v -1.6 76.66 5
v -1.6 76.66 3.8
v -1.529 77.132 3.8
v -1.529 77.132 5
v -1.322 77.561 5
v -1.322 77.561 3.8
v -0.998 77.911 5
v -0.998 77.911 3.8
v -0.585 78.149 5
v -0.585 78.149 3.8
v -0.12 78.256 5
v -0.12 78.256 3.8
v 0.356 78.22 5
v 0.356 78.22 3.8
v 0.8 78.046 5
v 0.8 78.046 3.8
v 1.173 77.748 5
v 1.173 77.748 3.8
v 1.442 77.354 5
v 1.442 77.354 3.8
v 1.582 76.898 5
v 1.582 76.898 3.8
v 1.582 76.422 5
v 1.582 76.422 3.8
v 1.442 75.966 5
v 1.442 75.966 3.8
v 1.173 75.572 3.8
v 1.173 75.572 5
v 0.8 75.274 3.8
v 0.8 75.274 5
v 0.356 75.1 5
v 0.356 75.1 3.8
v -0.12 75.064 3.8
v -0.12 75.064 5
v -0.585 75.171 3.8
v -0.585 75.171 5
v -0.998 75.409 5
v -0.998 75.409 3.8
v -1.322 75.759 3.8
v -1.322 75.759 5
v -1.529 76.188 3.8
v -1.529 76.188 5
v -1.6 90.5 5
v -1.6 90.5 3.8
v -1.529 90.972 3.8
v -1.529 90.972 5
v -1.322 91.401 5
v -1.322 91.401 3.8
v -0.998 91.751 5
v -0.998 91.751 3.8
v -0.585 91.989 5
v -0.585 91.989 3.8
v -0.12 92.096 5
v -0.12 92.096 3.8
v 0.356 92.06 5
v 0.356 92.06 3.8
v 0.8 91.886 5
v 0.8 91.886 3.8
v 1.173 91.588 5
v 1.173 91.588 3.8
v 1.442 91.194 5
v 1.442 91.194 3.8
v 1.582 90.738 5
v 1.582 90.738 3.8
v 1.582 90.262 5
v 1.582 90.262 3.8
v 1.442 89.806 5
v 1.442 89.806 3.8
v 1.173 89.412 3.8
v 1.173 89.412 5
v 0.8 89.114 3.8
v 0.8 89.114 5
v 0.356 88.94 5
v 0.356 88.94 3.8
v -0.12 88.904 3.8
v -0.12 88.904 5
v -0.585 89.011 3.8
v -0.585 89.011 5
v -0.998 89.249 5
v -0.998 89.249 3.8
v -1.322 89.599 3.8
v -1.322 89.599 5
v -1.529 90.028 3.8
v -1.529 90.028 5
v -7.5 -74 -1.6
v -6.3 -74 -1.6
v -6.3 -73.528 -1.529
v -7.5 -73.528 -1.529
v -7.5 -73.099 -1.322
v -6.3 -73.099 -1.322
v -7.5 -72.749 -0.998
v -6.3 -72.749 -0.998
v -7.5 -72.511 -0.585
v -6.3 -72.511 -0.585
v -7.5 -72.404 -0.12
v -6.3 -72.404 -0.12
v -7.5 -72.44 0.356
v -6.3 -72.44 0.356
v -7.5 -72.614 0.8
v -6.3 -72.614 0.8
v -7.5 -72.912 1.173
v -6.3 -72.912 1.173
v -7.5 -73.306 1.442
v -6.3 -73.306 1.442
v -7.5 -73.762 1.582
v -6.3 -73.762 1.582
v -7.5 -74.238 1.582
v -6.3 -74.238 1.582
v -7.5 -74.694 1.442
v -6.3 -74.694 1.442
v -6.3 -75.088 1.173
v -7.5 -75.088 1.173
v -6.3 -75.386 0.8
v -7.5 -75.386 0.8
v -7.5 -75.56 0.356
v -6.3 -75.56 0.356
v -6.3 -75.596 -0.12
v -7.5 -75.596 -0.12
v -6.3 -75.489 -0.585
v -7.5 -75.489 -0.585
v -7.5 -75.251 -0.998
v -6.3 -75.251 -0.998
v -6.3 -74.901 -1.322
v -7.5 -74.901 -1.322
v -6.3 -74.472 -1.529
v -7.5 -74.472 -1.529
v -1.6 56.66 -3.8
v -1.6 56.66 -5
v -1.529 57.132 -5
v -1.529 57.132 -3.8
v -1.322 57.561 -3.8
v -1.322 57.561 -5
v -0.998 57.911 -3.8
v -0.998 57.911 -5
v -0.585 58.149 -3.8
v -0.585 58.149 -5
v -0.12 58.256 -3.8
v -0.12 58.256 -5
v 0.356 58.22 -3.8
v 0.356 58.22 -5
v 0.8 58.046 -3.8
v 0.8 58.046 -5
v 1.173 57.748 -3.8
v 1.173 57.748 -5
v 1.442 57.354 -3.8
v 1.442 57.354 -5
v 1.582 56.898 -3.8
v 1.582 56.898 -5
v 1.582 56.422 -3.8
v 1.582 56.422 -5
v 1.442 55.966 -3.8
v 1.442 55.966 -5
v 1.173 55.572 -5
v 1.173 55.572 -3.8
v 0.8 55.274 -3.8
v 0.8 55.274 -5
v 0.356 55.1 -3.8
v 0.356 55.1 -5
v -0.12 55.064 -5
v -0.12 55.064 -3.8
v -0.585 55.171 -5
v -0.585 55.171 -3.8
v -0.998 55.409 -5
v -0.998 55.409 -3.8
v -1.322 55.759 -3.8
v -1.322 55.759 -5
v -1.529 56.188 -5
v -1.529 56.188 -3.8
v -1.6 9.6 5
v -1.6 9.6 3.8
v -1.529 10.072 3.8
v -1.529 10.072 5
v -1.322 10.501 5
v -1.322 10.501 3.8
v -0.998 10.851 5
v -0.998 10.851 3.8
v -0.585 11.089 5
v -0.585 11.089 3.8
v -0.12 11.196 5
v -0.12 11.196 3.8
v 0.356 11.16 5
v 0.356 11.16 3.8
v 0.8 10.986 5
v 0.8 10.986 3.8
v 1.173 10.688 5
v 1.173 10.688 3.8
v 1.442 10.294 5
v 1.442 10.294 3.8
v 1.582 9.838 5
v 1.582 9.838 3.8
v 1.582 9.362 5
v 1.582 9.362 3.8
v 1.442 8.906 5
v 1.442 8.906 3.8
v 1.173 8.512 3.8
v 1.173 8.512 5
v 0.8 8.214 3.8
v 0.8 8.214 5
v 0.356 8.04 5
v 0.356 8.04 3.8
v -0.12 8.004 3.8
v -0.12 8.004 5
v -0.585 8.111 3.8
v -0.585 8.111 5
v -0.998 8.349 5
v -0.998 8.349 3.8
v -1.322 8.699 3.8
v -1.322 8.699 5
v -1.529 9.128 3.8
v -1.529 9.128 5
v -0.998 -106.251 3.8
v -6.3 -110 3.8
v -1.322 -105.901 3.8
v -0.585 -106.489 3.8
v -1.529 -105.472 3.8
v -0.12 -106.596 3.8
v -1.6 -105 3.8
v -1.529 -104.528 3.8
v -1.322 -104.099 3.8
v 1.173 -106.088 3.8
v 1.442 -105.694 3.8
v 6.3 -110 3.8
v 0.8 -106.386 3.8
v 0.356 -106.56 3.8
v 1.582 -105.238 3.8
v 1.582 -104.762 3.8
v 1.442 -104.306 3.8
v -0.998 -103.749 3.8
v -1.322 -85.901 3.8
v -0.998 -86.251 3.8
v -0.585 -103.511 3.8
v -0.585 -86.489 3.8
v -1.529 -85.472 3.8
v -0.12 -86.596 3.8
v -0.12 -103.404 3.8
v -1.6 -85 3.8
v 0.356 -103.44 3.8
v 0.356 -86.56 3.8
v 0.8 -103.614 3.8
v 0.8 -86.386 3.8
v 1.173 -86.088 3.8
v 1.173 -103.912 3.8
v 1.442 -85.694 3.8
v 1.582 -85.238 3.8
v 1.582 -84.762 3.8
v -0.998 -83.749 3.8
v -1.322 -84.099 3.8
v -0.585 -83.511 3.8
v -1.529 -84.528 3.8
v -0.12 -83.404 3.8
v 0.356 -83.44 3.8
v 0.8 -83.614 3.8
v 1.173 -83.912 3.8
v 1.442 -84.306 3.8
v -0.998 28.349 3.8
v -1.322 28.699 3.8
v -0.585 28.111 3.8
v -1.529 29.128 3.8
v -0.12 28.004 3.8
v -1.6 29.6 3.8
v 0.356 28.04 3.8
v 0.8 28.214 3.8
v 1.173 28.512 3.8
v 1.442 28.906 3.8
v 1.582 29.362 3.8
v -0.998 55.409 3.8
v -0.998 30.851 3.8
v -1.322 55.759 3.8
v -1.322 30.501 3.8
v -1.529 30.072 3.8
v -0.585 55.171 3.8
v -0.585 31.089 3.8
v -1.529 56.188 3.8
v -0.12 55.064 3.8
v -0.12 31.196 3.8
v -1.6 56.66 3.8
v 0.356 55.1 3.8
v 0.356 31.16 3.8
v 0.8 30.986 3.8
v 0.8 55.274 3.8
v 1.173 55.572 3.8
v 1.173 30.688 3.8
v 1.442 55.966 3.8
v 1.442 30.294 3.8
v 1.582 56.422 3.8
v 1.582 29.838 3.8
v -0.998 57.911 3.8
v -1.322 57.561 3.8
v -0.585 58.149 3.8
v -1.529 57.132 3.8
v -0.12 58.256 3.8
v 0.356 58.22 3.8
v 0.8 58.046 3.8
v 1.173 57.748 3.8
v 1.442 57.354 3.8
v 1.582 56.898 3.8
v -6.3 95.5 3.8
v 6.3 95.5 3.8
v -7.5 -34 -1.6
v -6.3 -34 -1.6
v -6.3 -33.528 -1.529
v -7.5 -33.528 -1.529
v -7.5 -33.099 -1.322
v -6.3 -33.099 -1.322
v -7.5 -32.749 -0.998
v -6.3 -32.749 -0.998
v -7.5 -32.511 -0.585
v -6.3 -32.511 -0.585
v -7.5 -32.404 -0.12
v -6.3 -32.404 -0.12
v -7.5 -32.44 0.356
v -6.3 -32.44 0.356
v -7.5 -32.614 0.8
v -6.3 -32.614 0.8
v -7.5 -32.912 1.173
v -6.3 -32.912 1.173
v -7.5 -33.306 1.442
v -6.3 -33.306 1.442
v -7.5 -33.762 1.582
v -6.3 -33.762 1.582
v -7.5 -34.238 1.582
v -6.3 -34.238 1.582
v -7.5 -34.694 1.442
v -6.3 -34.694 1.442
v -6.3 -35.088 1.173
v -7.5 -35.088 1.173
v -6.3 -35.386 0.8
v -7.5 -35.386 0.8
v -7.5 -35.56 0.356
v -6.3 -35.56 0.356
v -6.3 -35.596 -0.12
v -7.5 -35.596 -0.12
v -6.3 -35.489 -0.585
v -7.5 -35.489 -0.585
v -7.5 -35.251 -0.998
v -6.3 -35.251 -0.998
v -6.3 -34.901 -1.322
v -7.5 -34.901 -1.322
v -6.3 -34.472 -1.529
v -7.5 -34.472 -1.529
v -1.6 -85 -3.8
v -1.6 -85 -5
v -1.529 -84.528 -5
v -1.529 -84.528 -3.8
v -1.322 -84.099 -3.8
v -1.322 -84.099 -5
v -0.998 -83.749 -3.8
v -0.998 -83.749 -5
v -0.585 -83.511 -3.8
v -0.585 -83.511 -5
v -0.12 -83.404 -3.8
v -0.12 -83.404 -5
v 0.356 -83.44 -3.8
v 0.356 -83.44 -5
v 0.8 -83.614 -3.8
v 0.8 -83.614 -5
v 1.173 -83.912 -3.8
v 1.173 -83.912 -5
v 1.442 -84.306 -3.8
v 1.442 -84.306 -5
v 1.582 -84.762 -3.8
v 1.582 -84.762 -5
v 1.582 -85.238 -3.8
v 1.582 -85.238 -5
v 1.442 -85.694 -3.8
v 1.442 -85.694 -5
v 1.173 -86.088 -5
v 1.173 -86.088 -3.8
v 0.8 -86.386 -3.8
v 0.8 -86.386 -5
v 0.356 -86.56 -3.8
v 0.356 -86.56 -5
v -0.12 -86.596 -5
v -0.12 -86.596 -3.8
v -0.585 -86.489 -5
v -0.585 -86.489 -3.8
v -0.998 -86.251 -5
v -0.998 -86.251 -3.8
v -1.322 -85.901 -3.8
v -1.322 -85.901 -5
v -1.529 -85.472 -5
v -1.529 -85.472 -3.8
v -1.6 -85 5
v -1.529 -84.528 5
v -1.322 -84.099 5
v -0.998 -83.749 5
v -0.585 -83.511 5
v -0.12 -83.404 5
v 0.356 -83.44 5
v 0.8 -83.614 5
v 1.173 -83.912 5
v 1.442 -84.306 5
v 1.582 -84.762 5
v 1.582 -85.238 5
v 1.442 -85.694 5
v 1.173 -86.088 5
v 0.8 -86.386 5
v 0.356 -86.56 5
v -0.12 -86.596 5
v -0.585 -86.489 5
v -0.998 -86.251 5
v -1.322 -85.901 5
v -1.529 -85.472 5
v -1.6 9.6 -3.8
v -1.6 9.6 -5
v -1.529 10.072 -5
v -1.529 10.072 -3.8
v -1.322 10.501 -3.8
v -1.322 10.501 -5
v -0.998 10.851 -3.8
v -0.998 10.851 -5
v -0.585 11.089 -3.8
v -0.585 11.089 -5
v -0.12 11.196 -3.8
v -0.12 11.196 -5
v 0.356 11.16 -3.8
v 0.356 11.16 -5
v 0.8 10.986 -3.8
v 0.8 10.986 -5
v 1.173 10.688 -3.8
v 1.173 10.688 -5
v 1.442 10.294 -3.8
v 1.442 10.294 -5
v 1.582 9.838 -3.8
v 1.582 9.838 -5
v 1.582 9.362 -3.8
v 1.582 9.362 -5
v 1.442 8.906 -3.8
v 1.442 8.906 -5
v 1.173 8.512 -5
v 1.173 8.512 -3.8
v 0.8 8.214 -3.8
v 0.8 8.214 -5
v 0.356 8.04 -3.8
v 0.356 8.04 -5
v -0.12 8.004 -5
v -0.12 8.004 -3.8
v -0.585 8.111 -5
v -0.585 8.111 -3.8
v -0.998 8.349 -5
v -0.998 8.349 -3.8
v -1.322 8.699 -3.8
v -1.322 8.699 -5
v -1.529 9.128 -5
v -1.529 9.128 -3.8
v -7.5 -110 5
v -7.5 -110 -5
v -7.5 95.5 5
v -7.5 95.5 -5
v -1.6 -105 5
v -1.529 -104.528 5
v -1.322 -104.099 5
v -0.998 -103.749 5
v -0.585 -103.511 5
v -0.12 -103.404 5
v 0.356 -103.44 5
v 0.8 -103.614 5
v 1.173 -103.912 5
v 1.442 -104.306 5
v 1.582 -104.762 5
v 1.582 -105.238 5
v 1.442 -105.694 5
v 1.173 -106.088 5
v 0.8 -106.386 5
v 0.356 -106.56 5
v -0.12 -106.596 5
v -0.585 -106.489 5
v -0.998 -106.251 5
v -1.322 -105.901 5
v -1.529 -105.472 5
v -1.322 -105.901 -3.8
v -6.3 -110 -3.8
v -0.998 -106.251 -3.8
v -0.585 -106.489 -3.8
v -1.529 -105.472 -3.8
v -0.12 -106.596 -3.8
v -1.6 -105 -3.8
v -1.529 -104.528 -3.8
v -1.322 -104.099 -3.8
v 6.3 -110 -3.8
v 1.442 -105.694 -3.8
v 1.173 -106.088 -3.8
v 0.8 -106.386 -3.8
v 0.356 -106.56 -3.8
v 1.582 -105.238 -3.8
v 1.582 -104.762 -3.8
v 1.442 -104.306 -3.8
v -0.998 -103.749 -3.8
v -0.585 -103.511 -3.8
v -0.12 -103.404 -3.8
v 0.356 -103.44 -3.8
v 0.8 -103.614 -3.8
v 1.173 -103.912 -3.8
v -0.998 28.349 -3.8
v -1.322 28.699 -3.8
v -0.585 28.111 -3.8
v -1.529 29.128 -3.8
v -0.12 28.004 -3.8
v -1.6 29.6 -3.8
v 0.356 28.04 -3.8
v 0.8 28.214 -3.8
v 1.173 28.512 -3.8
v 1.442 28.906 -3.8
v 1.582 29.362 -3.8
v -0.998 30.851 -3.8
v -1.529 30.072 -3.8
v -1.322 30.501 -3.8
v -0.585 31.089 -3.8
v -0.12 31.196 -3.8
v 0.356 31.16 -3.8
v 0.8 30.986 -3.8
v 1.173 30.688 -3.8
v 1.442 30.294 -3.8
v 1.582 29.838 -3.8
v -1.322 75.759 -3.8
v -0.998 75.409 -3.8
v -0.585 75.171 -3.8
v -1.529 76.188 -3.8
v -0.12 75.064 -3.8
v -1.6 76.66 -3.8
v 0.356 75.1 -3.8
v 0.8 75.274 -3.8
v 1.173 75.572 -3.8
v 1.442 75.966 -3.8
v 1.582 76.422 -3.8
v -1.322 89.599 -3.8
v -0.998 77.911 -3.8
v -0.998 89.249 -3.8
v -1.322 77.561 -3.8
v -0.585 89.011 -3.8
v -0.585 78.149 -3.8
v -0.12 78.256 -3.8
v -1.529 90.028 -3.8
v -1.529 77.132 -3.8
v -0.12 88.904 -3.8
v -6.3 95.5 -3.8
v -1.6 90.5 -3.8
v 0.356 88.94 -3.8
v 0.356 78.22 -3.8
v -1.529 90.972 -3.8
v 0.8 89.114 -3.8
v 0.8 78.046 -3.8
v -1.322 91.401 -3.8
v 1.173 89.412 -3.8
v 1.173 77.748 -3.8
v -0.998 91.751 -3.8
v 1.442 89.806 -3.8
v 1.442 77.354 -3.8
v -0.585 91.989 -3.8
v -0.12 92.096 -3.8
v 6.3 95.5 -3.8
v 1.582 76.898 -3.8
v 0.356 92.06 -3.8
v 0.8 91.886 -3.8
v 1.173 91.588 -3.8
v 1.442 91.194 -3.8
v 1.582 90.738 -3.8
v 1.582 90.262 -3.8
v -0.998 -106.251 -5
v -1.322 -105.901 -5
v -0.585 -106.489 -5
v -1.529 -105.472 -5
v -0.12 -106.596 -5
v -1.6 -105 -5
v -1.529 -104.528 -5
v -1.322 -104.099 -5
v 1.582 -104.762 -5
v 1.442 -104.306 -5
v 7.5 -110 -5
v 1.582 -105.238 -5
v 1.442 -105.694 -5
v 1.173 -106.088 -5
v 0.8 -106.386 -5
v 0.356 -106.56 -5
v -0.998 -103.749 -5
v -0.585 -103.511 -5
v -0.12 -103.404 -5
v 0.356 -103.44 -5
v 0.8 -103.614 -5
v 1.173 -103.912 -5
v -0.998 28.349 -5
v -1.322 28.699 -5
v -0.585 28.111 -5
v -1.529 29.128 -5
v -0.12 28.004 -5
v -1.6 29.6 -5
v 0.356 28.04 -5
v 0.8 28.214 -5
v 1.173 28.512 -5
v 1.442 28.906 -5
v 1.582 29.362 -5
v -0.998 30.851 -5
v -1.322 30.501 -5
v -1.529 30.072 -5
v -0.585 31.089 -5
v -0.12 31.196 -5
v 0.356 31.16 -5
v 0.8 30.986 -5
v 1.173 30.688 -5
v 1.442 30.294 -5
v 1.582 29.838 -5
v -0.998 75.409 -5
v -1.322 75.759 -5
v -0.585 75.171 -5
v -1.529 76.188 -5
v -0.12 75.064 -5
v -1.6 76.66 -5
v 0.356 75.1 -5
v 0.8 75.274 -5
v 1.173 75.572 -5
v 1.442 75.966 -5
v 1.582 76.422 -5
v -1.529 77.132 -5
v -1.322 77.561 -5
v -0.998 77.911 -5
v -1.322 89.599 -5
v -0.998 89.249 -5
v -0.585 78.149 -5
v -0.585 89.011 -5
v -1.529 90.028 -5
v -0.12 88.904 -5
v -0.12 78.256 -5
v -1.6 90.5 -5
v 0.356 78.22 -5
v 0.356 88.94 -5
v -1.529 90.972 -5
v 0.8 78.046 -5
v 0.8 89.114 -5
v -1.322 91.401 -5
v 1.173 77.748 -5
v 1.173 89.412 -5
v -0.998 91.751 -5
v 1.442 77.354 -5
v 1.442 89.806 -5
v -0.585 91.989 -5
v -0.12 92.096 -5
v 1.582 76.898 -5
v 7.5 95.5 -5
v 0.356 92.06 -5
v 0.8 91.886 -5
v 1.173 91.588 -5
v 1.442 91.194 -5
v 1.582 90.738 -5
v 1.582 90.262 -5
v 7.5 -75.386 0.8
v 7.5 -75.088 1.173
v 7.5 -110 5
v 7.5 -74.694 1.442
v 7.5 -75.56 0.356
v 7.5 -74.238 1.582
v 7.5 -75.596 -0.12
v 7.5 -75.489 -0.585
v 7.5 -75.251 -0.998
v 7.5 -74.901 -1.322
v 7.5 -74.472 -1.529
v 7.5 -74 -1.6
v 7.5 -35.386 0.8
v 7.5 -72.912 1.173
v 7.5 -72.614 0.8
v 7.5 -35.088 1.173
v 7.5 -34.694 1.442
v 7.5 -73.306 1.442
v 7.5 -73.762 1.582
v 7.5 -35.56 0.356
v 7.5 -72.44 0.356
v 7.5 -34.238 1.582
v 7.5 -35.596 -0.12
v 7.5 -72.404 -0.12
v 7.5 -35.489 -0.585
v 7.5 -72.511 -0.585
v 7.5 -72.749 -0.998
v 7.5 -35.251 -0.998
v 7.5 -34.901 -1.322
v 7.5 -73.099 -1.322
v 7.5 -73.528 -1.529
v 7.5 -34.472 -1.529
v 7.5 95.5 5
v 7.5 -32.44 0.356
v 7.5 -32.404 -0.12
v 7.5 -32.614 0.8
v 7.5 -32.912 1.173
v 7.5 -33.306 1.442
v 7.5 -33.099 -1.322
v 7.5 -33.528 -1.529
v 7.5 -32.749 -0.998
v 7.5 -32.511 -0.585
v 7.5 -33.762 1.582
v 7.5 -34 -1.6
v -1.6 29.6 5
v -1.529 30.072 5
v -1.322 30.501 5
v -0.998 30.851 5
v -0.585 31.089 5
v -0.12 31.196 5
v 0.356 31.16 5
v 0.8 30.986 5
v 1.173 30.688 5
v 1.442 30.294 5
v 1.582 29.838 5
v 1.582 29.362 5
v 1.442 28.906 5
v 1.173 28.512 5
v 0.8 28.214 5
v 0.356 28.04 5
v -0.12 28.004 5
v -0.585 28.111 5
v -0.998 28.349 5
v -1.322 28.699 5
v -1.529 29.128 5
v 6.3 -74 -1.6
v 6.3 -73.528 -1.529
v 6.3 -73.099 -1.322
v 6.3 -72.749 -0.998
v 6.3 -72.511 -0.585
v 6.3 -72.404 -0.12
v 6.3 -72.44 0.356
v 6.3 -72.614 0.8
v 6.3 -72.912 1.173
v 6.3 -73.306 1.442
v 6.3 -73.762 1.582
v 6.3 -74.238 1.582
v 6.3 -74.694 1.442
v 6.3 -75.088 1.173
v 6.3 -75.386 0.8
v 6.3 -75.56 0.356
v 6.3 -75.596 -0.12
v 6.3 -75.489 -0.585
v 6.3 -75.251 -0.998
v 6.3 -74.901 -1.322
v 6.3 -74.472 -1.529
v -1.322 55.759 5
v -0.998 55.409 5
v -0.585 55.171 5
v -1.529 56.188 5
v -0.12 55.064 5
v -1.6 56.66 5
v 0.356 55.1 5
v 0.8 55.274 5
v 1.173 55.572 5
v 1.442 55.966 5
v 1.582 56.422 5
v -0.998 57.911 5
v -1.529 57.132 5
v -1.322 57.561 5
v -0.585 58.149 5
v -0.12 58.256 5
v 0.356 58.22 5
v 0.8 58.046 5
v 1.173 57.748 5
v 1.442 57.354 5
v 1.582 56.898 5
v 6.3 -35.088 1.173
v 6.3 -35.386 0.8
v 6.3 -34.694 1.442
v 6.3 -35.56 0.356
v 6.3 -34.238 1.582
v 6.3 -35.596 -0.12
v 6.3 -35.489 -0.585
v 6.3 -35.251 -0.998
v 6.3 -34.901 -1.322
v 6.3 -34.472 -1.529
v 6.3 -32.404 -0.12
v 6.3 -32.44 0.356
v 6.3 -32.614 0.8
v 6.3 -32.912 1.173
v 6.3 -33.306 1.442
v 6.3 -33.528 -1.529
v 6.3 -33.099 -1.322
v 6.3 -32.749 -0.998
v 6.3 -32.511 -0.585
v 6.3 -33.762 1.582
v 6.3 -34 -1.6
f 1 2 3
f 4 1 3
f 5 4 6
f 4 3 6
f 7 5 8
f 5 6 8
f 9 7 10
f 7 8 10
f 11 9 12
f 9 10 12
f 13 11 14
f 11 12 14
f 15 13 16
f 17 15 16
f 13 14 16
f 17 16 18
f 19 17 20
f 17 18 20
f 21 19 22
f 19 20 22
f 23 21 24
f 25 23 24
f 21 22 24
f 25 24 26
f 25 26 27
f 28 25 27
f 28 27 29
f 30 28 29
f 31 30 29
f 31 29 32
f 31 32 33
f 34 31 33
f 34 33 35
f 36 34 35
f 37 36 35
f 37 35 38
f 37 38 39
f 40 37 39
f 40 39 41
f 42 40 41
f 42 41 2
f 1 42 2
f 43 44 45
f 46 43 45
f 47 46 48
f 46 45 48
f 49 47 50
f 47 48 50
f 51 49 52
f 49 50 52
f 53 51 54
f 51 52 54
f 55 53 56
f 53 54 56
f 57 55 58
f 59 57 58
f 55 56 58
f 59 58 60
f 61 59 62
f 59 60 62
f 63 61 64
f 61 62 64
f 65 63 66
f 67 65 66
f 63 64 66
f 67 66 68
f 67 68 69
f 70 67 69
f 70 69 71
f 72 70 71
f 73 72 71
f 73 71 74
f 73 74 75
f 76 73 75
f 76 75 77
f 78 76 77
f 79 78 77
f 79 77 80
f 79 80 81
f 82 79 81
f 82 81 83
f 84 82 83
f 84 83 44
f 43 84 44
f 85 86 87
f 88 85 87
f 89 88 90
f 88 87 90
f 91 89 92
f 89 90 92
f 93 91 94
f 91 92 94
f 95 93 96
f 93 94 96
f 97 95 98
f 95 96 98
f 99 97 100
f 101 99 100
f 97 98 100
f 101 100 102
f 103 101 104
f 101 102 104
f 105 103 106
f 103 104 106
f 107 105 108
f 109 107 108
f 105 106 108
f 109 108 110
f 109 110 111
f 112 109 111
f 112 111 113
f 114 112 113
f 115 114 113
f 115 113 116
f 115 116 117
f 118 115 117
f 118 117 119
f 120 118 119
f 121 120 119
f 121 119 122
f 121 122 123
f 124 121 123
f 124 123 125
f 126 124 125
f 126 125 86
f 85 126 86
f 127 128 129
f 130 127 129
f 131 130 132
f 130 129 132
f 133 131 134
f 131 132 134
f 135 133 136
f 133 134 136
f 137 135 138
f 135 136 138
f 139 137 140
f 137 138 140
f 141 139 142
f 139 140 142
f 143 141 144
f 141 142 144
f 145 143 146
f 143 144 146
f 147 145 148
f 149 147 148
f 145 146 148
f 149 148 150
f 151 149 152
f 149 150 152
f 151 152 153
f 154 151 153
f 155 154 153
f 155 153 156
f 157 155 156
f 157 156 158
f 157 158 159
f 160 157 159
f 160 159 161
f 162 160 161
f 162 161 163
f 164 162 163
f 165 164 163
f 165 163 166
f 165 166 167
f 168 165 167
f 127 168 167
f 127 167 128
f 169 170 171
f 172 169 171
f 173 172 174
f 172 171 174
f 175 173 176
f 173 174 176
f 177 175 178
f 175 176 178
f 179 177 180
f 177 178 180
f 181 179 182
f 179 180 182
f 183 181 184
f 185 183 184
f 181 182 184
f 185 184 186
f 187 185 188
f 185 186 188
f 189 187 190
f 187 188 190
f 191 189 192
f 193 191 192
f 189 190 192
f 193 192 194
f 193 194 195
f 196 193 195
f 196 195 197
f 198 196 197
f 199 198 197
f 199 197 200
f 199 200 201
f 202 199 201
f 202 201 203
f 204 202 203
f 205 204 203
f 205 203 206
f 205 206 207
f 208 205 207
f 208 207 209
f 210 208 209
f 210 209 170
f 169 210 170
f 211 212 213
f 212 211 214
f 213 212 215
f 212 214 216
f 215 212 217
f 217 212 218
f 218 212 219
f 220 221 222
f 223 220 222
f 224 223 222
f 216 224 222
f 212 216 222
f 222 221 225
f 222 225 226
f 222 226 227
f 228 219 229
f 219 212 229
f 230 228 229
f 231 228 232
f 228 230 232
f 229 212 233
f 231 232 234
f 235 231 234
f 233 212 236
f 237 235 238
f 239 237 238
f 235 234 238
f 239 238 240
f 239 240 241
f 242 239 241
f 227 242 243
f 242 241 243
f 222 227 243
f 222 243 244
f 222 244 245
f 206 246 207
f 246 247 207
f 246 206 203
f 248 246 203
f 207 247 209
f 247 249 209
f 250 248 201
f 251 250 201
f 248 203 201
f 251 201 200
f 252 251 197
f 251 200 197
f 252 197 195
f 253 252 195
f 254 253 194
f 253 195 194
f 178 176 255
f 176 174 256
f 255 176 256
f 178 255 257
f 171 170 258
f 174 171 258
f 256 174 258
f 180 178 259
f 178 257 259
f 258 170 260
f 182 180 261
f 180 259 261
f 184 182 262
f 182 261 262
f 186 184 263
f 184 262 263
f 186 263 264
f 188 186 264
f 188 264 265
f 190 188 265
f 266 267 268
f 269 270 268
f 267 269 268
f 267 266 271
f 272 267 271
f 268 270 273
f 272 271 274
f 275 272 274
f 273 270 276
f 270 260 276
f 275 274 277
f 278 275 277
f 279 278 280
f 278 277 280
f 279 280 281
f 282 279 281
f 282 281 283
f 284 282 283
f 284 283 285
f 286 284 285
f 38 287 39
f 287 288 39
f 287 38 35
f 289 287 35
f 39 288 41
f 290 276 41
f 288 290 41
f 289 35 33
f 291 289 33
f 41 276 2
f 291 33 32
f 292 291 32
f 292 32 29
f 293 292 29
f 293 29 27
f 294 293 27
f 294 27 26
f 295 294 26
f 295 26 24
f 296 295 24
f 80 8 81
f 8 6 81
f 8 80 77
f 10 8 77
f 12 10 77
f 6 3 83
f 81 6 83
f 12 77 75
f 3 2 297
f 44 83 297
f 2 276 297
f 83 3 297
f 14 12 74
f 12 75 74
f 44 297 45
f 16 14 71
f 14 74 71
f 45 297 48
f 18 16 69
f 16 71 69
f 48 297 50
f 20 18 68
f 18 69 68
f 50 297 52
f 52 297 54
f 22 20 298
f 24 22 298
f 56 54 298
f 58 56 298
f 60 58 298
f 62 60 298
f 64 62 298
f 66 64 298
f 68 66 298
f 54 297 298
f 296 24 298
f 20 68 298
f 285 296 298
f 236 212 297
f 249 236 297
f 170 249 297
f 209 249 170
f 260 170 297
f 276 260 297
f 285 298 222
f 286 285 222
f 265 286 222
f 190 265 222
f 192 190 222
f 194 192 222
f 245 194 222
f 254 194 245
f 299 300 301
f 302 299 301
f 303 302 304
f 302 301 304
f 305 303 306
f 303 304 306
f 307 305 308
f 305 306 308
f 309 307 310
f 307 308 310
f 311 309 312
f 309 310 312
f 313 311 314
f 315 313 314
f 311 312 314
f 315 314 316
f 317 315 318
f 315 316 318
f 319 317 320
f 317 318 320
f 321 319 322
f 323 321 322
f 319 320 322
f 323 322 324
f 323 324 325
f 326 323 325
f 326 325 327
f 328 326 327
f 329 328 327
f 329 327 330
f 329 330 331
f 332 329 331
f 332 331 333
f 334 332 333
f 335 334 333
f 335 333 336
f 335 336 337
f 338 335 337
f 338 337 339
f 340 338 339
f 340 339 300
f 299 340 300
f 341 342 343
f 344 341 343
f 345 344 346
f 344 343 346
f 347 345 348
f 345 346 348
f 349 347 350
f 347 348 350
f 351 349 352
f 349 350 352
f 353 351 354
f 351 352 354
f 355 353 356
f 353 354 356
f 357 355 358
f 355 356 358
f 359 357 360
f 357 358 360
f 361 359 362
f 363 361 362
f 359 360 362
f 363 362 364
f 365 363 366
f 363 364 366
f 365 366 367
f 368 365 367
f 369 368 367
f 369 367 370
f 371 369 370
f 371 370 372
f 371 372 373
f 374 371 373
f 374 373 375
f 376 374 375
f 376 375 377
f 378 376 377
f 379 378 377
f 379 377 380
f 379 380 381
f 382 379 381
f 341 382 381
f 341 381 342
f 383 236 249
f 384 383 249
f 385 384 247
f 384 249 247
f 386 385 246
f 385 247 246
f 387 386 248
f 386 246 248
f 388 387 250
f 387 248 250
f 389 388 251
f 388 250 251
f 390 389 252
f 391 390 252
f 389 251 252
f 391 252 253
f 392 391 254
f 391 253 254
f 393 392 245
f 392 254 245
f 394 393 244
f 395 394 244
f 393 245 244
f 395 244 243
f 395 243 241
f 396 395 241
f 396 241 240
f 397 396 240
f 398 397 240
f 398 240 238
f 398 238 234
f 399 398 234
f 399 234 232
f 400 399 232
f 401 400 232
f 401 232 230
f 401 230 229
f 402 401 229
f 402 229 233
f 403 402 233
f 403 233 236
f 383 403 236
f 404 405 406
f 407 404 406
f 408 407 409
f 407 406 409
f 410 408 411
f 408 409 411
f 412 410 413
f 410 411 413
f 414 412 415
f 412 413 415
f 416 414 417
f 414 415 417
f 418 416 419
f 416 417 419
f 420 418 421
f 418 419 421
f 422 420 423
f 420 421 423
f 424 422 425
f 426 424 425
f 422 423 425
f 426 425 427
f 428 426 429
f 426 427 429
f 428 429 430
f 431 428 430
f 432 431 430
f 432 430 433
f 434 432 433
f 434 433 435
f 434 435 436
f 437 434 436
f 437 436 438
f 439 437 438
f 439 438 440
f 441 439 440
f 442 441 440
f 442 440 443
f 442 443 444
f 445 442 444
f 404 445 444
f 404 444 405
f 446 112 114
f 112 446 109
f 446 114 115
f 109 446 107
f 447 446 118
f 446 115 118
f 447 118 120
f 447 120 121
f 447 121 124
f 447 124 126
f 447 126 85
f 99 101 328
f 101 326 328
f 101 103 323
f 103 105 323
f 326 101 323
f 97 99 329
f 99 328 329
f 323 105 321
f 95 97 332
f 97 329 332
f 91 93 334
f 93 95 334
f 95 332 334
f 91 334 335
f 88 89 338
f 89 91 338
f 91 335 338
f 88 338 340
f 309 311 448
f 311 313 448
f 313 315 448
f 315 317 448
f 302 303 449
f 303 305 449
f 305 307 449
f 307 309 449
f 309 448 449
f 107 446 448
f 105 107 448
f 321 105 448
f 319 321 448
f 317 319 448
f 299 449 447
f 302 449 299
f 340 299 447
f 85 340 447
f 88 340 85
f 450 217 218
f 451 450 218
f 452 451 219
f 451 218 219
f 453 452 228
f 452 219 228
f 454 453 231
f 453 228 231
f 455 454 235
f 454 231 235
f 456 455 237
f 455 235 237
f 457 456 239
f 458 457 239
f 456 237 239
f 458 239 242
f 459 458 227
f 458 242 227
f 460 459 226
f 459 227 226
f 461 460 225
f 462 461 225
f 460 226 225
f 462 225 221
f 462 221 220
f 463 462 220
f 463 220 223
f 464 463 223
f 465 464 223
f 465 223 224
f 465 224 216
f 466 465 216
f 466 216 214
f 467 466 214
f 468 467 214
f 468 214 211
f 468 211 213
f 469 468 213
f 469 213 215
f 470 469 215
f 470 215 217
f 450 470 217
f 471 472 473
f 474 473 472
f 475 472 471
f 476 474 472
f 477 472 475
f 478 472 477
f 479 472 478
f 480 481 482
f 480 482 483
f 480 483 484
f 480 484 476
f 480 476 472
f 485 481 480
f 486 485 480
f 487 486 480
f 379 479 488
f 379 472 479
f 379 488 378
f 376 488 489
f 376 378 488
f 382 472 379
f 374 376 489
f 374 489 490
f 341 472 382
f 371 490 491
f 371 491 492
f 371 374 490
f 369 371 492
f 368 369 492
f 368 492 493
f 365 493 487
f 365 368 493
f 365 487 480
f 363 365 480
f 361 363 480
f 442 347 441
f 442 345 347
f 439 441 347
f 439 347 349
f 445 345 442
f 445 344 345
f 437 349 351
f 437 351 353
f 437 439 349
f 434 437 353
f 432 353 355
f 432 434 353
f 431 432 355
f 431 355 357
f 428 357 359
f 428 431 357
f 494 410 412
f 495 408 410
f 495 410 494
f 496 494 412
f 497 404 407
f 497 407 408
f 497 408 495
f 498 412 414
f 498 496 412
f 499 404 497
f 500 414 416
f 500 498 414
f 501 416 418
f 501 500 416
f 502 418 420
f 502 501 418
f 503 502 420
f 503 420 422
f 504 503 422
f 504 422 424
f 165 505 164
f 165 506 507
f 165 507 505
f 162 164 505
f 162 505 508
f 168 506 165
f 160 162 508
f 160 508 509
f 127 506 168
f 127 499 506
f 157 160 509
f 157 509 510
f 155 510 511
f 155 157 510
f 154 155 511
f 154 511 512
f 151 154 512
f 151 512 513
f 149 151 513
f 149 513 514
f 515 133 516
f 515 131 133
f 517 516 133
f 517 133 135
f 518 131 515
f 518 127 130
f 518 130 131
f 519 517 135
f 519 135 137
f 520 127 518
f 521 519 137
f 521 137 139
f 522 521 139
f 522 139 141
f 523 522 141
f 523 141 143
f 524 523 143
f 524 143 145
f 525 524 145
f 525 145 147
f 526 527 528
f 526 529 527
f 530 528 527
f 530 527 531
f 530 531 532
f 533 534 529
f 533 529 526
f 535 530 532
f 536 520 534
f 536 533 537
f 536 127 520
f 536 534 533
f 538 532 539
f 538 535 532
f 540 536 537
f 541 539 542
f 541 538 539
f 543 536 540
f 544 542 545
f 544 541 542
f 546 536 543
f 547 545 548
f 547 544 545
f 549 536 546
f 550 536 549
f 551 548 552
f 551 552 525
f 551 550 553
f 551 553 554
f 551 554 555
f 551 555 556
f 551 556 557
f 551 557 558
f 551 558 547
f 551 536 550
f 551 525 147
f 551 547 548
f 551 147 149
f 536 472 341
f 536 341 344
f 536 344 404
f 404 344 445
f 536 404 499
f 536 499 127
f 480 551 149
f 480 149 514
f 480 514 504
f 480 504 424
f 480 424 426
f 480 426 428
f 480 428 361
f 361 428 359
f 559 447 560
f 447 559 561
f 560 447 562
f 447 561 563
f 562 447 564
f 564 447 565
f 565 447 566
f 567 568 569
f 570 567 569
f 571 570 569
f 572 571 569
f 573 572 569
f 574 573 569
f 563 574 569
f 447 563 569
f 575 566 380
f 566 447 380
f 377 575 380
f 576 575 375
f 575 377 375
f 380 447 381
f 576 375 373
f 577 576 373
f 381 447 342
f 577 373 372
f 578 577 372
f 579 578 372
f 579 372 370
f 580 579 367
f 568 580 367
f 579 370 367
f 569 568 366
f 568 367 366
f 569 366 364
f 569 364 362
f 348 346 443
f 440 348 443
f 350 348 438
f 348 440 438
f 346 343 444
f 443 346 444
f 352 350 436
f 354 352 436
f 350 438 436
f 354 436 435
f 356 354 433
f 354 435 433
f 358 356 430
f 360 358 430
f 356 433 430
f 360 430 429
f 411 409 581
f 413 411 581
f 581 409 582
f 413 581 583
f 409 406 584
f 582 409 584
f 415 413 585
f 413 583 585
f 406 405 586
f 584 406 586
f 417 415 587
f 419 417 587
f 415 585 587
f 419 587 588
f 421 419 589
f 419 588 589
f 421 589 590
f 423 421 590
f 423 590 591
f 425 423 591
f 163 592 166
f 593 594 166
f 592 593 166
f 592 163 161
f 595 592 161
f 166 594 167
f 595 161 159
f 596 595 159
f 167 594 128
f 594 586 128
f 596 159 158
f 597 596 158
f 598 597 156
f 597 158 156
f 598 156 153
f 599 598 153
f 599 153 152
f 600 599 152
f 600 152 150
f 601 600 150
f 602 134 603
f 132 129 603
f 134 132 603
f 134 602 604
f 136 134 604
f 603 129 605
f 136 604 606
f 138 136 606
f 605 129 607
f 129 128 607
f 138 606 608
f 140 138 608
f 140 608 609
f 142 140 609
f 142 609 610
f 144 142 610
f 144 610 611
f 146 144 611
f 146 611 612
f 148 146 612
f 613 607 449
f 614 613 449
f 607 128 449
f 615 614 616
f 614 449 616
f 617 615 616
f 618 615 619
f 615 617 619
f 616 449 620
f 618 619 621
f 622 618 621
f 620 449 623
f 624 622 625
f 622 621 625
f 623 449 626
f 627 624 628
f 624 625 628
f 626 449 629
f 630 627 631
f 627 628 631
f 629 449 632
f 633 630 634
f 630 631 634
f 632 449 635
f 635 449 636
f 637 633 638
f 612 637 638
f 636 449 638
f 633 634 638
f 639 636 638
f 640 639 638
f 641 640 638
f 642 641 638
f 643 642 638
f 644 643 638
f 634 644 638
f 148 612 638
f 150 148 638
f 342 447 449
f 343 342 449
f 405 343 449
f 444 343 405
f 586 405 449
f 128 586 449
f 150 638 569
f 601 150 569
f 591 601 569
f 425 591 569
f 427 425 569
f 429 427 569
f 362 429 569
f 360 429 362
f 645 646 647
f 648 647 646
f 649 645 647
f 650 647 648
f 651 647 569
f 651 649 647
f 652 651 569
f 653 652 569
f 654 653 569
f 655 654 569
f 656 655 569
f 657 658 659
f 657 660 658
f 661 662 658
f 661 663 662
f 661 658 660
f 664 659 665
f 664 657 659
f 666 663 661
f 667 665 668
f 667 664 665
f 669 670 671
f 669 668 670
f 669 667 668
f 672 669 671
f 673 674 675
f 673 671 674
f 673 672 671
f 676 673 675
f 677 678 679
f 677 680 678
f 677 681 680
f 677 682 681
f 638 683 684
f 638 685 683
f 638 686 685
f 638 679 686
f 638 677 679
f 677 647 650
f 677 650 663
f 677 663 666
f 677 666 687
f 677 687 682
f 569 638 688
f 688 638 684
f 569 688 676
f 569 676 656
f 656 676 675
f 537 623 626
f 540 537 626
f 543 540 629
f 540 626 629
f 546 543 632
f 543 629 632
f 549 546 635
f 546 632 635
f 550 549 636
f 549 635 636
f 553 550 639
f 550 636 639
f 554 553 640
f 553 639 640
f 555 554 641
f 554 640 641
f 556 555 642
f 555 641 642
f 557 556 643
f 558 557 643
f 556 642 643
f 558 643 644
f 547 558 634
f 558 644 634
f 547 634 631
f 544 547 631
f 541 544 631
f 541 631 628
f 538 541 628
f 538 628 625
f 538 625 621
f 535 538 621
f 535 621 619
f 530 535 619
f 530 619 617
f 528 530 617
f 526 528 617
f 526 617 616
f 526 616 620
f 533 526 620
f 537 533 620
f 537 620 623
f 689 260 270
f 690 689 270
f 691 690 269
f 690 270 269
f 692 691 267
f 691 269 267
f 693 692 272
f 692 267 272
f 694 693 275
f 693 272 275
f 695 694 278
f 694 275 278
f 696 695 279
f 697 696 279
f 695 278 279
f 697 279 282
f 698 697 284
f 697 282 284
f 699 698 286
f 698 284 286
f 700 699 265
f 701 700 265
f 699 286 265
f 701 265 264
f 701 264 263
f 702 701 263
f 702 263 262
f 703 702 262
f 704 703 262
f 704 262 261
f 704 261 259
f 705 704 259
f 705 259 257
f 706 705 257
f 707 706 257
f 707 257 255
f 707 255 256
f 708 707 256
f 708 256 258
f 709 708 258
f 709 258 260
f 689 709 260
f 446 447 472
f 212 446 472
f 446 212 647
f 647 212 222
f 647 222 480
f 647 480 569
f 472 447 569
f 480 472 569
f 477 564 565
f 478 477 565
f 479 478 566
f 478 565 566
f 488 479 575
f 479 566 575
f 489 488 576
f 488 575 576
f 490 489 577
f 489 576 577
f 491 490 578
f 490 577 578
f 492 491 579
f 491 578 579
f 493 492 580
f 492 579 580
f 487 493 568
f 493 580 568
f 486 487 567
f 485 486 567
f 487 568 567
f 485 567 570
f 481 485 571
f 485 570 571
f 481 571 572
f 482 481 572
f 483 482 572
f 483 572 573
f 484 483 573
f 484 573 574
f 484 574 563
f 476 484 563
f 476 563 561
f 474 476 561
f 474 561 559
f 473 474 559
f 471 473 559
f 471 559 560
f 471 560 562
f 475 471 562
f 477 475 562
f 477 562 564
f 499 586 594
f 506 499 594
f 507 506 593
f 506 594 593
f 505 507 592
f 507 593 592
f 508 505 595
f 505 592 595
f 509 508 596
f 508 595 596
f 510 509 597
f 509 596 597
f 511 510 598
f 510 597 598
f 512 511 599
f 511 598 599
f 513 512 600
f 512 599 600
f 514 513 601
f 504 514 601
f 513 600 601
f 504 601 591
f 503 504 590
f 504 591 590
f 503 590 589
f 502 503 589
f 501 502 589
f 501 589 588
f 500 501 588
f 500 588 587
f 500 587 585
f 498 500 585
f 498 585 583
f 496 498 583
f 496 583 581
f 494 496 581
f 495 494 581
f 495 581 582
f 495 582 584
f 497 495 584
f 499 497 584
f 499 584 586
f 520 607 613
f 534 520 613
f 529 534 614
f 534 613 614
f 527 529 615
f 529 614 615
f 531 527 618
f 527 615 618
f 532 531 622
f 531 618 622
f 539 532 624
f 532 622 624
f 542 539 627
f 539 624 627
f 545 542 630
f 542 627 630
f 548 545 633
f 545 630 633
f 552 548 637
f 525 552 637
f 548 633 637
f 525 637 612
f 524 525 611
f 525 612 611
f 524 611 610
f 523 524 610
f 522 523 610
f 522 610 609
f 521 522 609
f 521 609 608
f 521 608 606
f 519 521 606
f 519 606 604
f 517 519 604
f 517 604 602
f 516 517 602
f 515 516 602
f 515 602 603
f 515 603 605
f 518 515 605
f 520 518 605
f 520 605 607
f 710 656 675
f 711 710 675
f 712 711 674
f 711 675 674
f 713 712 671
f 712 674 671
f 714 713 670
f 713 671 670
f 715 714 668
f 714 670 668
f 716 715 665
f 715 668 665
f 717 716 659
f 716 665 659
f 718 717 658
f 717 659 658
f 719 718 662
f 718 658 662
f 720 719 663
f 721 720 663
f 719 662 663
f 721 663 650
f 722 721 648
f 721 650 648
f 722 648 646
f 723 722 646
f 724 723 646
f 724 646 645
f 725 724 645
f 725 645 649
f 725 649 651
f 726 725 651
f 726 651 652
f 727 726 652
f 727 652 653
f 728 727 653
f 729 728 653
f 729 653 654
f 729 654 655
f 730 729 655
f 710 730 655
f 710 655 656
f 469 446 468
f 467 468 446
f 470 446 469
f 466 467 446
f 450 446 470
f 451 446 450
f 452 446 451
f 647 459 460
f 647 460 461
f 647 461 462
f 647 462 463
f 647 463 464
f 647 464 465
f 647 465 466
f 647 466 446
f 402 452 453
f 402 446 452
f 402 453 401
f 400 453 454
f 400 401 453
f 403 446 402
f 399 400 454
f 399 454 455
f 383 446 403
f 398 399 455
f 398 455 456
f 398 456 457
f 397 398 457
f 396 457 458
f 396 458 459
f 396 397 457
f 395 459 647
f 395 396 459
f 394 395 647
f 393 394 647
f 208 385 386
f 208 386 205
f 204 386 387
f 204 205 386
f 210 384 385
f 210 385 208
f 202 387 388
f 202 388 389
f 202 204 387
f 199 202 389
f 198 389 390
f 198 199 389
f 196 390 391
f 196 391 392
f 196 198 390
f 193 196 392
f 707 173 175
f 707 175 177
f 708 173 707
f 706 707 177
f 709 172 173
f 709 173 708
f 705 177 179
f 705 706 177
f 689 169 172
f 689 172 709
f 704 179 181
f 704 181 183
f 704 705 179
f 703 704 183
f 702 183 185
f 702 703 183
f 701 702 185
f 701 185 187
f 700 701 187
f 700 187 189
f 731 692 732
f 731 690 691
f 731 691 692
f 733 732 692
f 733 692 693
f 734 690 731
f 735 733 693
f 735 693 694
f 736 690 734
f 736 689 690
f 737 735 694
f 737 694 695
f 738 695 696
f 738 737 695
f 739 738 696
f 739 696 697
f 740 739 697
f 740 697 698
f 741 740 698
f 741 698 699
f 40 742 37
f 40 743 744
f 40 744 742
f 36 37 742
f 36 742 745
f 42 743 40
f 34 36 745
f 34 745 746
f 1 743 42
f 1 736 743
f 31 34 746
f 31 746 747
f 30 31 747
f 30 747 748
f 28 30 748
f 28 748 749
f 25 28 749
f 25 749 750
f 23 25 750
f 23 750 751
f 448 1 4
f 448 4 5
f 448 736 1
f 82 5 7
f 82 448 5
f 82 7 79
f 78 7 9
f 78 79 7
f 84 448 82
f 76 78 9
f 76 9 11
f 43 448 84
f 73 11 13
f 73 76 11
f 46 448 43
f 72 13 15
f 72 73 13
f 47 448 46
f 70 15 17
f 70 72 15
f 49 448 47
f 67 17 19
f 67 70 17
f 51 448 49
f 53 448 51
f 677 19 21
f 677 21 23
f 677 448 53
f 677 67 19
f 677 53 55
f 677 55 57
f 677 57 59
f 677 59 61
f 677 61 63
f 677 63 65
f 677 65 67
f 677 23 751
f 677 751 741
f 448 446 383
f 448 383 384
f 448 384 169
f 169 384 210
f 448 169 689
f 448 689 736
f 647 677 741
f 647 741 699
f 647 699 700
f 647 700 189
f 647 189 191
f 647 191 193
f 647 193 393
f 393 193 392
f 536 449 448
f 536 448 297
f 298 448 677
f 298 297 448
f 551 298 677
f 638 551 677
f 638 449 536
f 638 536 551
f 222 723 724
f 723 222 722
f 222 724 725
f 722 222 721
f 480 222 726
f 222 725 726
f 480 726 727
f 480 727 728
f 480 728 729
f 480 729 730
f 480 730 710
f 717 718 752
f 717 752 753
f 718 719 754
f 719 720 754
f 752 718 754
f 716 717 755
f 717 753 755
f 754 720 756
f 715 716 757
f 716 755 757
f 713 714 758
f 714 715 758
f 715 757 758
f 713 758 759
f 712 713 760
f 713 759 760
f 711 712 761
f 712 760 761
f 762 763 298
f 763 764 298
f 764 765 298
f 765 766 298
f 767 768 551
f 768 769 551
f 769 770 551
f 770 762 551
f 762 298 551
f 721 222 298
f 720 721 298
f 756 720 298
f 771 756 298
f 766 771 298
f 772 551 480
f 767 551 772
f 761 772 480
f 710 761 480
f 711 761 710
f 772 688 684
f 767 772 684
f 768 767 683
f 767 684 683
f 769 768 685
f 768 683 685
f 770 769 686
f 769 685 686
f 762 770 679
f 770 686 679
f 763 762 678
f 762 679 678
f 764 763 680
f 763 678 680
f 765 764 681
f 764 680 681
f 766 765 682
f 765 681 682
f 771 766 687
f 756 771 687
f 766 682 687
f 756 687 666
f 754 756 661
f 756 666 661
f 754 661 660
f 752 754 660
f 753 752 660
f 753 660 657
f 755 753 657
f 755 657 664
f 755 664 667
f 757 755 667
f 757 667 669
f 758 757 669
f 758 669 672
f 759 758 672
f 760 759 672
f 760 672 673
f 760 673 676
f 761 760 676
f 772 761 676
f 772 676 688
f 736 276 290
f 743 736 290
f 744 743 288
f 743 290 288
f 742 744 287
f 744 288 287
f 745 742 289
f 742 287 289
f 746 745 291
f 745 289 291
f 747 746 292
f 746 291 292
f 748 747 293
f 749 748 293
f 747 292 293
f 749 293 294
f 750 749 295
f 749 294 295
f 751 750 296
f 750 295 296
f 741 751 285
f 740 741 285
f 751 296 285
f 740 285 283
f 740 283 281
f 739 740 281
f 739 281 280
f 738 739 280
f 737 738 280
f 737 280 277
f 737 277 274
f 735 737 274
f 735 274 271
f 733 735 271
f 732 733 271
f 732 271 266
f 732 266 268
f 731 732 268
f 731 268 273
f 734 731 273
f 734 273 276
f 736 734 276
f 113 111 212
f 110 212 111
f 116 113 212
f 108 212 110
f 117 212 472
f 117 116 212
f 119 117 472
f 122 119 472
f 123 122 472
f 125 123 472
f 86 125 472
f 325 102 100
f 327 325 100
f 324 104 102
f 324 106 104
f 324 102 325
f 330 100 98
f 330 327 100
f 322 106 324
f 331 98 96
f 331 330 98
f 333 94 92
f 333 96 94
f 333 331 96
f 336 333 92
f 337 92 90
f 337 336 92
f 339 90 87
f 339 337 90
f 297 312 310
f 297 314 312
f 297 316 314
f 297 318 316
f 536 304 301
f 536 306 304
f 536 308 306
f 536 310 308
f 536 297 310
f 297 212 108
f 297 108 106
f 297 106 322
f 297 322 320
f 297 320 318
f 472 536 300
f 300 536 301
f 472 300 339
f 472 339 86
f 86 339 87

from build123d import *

# Parameters (mm, degrees)
SKETCH_1_W          = 15
SKETCH_1_H          = 10
SKETCH_1_W_2        = 12.6
SKETCH_1_H_2        = 7.6
EXTRUDE_1_DEPTH     = 110
SKETCH_2_R          = 1.6
CUT_EXTRUDE_1_DEPTH = 100
SKETCH_3_R          = 1.6
CUT_EXTRUDE_2_DEPTH = 15
SKETCH_5_W          = 15
SKETCH_5_H          = 10
CUT_EXTRUDE_4_DEPTH = 14.5
SKETCH_6_R          = 1.6
CUT_EXTRUDE_5_DEPTH = 15
SKETCH_7_R          = 1.6
CUT_EXTRUDE_6_DEPTH = 10


with BuildPart() as part:
    # ｽｹｯﾁ1 → ﾎﾞｽ - 押し出し1 (new, symmetric)
    with BuildSketch(Plane(origin=(0, 0, 0), x_dir=(1, 0, 0), z_dir=(0, 1, 0))):
        Rectangle(SKETCH_1_W, SKETCH_1_H)
        Rectangle(SKETCH_1_W_2, SKETCH_1_H_2, mode=Mode.SUBTRACT)
    extrude(amount=EXTRUDE_1_DEPTH, both=True)

    # ｽｹｯﾁ2 → ｶｯﾄ - 押し出し1 (cut)
    with BuildSketch(Plane(origin=(0, 0, -5), x_dir=(-1, 0, 0), z_dir=(0, 0, -1))):
        with Locations((0, -85)):
            Circle(SKETCH_2_R)
        with Locations((0, -105)):
            Circle(SKETCH_2_R)
    extrude(amount=-CUT_EXTRUDE_1_DEPTH, mode=Mode.SUBTRACT)

    # ｽｹｯﾁ3 → ｶｯﾄ - 押し出し2 (cut)
    with BuildSketch(Plane(origin=(7.5, 0, 0), x_dir=(0, 0, -1), z_dir=(1, 0, 0))):
        with Locations((0, -34)):
            Circle(SKETCH_3_R)
        with Locations((0, -74)):
            Circle(SKETCH_3_R)
    extrude(amount=-CUT_EXTRUDE_2_DEPTH, mode=Mode.SUBTRACT)

    # ｽｹｯﾁ5 → ｶｯﾄ - 押し出し4 (cut)
    with BuildSketch(Plane(origin=(0, 110, 0), x_dir=(1, 0, 0), z_dir=(0, 1, 0))):
        Rectangle(SKETCH_5_W, SKETCH_5_H)
    extrude(amount=-CUT_EXTRUDE_4_DEPTH, mode=Mode.SUBTRACT)

    # ｽｹｯﾁ6 → ｶｯﾄ - 押し出し5 (cut)
    with BuildSketch(Plane(origin=(0, 0, -5), x_dir=(-1, 0, 0), z_dir=(0, 0, -1))):
        with Locations((0, 90.5)):
            Circle(SKETCH_6_R)
        with Locations((0, 76.66)):
            Circle(SKETCH_6_R)
        with Locations((0, 56.66)):
            Circle(SKETCH_6_R)
    extrude(amount=-CUT_EXTRUDE_5_DEPTH, mode=Mode.SUBTRACT)

    # ｽｹｯﾁ7 → ｶｯﾄ - 押し出し6 (cut)
    with BuildSketch(Plane(origin=(0, 0, -5), x_dir=(-1, 0, 0), z_dir=(0, 0, -1))):
        with Locations((0, 9.6)):
            Circle(SKETCH_7_R)
        with Locations((0, 29.6)):
            Circle(SKETCH_7_R)
    extrude(amount=-CUT_EXTRUDE_6_DEPTH, mode=Mode.SUBTRACT)


solid = part.part
